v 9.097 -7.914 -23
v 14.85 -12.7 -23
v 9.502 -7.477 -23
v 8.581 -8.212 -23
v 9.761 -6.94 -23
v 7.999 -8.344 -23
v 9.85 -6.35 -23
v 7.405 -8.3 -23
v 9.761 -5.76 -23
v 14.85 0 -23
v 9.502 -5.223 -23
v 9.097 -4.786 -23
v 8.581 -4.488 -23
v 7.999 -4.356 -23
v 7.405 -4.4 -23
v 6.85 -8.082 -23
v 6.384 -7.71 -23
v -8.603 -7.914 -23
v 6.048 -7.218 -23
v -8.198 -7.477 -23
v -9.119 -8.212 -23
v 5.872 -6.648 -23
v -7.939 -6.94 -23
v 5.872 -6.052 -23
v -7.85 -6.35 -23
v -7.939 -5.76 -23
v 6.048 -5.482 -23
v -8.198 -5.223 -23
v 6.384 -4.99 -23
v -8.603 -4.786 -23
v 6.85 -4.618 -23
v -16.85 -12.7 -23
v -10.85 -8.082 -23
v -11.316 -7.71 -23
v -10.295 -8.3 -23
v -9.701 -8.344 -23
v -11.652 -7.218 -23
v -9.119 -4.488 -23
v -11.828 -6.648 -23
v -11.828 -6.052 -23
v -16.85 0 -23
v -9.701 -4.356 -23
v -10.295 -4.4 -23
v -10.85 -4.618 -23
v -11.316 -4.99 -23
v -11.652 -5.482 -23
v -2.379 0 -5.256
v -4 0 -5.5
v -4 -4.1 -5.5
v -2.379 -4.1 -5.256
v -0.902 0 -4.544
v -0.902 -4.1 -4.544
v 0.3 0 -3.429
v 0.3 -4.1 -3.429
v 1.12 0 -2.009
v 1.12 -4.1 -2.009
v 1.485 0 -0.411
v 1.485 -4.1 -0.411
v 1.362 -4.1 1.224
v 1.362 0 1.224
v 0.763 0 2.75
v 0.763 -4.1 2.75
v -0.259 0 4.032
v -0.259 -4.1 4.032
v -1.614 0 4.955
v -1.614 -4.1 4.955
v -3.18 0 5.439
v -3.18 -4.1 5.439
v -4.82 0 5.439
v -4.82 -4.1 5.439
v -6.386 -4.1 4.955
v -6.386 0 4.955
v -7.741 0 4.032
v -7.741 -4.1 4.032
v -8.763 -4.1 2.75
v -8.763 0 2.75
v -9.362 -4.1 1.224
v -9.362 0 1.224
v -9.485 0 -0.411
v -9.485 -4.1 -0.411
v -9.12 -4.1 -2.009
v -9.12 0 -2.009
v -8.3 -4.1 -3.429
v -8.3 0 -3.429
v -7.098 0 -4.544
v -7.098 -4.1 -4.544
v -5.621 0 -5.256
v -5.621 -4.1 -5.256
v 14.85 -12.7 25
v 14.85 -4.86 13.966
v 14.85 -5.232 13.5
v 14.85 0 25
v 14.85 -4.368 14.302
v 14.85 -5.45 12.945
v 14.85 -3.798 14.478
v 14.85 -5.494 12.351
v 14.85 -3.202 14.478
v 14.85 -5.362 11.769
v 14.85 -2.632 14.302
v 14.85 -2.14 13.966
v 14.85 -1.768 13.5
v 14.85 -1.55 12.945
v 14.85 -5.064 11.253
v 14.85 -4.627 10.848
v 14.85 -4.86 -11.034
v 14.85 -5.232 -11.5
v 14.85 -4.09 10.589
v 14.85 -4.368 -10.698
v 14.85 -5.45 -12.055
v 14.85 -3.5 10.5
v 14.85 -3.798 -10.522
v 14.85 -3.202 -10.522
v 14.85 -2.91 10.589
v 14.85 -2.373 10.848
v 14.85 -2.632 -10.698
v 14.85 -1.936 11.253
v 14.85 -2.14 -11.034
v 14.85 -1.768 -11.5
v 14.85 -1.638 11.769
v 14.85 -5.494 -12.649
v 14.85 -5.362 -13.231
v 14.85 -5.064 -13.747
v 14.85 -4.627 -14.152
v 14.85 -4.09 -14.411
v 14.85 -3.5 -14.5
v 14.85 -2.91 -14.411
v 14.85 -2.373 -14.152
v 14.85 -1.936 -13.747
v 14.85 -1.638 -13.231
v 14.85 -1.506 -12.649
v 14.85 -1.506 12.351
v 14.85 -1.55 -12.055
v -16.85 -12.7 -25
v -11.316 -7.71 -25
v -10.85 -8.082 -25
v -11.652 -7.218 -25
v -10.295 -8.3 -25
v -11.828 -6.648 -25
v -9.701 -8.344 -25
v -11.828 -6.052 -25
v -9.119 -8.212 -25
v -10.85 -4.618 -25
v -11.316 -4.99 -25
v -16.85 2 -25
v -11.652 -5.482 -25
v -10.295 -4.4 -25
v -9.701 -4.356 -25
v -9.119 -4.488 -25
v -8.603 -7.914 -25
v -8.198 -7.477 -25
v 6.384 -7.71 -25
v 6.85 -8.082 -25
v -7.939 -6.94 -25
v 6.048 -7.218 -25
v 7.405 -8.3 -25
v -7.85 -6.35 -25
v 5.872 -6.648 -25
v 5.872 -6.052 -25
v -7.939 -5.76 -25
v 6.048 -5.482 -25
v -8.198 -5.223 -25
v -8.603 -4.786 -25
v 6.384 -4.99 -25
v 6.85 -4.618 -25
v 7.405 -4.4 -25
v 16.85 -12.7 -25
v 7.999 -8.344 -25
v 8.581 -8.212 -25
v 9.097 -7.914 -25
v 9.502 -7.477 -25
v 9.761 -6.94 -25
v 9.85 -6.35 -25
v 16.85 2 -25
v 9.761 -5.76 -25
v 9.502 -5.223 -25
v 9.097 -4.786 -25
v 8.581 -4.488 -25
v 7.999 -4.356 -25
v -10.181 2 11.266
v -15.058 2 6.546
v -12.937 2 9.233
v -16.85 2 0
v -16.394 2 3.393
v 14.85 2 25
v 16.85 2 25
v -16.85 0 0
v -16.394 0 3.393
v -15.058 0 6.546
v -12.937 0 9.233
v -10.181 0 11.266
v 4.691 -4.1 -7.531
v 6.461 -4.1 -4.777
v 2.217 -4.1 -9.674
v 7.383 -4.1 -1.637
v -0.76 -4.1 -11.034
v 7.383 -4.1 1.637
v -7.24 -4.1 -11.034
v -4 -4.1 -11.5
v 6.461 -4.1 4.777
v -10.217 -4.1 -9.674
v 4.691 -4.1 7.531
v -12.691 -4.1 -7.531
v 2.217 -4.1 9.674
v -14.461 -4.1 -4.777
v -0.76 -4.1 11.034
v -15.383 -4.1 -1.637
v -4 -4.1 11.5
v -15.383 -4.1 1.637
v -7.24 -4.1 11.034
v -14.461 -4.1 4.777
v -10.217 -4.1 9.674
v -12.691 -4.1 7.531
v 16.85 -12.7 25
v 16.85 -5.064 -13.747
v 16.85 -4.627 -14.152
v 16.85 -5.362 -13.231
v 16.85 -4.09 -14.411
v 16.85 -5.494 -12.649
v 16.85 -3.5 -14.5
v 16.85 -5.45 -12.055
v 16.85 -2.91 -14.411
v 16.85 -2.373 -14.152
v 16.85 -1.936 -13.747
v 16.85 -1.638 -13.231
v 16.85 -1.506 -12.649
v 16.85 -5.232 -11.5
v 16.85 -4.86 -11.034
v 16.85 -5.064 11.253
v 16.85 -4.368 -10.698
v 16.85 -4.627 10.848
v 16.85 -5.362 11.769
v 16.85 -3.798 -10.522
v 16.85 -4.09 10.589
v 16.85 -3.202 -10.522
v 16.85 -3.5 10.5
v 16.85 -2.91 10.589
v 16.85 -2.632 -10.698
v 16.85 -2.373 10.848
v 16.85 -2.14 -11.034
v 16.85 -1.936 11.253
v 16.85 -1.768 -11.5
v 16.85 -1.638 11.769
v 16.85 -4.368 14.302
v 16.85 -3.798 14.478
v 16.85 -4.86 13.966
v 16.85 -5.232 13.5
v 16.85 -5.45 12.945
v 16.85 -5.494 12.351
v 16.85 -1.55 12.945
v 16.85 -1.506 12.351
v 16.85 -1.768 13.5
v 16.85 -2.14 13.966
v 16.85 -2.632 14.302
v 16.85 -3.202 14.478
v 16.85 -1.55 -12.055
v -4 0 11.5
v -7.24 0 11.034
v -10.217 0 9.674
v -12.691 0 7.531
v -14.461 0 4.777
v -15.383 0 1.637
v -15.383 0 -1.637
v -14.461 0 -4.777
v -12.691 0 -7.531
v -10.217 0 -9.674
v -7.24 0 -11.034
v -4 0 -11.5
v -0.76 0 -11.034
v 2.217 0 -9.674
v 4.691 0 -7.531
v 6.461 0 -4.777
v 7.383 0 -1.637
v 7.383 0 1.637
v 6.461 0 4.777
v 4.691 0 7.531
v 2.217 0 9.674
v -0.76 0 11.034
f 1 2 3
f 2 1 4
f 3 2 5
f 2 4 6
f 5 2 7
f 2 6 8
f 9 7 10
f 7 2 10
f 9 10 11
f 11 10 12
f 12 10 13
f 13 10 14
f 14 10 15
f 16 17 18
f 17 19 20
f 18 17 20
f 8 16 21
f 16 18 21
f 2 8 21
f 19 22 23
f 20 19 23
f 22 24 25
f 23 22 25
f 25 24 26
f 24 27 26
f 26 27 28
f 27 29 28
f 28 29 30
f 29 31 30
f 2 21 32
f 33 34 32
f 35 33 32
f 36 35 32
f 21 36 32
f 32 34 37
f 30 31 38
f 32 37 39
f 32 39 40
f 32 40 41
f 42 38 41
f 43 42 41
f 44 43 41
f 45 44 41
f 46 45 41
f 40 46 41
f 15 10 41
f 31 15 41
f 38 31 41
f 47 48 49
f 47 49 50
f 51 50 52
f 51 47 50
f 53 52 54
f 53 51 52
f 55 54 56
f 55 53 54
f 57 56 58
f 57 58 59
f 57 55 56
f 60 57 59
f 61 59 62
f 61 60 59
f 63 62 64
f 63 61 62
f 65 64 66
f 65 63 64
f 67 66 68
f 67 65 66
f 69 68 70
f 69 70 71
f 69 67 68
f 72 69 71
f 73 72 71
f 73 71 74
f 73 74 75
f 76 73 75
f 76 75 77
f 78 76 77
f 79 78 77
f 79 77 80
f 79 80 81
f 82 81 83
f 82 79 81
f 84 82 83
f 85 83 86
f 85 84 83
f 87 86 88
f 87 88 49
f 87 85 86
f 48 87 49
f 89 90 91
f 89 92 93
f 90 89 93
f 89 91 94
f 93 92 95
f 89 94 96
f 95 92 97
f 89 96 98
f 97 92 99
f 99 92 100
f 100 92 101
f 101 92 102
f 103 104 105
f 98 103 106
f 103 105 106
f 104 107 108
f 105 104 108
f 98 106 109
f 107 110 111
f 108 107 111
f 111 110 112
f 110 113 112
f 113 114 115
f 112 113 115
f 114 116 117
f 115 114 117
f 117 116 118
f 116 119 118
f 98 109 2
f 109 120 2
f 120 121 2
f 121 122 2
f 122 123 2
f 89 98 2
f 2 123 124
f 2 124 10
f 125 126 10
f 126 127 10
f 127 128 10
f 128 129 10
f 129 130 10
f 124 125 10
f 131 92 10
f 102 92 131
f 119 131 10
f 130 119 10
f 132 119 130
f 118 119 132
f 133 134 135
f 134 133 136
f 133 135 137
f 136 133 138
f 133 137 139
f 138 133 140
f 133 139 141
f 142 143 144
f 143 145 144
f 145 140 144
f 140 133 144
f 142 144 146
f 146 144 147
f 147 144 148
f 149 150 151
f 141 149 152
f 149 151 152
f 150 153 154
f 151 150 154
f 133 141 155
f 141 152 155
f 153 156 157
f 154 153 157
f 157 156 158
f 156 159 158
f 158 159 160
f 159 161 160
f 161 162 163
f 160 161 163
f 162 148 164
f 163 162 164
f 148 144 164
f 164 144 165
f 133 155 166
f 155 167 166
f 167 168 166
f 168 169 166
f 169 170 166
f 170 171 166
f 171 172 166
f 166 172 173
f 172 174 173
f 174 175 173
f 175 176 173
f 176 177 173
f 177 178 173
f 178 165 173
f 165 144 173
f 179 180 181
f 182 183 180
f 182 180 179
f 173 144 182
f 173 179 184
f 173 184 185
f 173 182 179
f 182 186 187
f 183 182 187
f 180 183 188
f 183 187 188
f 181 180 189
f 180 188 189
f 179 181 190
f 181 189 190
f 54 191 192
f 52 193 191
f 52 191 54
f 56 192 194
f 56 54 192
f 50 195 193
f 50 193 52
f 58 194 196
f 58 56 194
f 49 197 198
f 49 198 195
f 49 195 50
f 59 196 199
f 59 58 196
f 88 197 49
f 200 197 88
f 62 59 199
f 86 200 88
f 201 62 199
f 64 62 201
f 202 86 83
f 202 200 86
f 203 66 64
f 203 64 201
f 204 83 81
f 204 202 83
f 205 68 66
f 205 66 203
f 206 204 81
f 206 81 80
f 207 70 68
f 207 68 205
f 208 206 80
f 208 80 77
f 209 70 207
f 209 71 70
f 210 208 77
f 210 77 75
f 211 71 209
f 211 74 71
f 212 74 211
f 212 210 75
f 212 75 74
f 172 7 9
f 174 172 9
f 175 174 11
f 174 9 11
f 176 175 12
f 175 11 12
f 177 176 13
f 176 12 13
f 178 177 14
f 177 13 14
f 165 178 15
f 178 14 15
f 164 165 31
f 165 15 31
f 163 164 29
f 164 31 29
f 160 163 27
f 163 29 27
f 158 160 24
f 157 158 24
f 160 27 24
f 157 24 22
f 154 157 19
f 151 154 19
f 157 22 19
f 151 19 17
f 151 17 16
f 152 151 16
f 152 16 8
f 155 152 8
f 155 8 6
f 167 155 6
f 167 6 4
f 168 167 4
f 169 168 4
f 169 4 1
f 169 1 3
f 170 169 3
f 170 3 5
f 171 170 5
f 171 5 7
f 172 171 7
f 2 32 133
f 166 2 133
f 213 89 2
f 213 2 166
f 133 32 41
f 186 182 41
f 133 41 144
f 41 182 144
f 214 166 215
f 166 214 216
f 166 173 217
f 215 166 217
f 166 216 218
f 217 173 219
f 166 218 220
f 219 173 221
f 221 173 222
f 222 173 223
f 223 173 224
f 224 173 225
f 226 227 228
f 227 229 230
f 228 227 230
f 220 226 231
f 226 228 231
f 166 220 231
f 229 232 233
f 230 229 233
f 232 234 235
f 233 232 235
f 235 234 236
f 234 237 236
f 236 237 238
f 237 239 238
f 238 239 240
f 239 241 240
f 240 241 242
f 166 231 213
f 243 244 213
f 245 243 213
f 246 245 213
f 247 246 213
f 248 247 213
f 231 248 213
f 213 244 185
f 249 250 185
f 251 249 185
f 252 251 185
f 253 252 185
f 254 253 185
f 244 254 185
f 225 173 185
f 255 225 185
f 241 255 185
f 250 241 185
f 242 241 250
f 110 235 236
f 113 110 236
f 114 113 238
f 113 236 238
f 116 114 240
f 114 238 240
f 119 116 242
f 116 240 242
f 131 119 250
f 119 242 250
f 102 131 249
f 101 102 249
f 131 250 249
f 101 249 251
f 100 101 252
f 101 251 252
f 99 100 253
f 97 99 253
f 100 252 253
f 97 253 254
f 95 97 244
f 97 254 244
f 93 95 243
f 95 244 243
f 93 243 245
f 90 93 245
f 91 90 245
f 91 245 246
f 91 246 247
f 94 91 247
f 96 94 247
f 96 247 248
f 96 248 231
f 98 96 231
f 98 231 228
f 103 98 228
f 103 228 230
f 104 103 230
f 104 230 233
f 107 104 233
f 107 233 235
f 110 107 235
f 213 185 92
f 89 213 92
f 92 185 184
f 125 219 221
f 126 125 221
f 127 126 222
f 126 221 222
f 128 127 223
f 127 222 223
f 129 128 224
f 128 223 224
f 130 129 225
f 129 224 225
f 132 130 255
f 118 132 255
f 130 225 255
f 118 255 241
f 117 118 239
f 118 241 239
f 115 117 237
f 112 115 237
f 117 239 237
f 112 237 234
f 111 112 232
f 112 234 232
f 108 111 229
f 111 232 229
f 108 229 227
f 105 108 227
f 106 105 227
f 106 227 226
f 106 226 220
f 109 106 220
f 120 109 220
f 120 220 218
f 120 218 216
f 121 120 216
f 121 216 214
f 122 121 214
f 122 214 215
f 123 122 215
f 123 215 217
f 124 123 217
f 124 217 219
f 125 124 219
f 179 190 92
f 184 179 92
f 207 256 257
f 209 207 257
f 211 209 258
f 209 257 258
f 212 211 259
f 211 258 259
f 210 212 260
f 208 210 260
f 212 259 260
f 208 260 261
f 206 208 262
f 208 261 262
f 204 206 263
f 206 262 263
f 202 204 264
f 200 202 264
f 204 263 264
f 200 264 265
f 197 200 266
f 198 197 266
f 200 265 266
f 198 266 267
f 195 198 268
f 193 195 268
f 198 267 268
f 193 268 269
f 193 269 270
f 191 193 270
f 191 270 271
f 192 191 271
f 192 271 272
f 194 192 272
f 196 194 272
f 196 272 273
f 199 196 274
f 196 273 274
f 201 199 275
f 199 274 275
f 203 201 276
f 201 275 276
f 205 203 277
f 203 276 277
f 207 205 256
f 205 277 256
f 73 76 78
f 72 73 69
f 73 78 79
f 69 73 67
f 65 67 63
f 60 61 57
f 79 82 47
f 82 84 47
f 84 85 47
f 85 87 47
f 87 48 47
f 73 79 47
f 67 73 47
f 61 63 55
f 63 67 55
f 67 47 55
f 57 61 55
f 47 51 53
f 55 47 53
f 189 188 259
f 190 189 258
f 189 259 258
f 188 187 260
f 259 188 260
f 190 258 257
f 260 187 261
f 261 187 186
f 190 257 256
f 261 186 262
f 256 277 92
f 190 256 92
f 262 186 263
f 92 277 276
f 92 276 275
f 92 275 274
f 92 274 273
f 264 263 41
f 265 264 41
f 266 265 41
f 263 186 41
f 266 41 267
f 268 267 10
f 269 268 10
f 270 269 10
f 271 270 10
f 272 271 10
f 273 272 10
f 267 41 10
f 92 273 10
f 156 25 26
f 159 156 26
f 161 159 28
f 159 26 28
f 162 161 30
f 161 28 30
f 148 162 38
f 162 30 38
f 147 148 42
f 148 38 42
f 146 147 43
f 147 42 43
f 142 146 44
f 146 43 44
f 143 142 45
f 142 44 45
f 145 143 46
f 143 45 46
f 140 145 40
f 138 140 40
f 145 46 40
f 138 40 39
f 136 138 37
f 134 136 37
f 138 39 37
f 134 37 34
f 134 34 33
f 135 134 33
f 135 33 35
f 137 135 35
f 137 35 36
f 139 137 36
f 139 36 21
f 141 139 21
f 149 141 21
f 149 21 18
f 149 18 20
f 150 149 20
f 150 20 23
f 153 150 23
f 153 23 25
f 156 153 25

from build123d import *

# Parameters (mm, degrees)
SKETCH2_W                    = 33.7
SKETCH2_H                    = 50
BOSS_EXTRUDE1_DEPTH          = 2
BOSS_EXTRUDE2_DEPTH          = 12.7
CUT_EXTRUDE1_REACH           = 45.84
SKETCH4_R                    = 2
SKETCH5_R                    = 11.5
SKETCH5_R_2                  = 5.5
BOSS_EXTRUDE3_DEPTH          = 4.1
CUT_EXTRUDE_THIN1_DEPTH      = 34.541206001
CUT_EXTRUDE_THIN1_DEPTH_BACK = 8.2
CUT_EXTRUDE2_REACH           = 54.433
SKETCH7_R                    = 2


with BuildPart() as part:
    # Sketch2 → Boss-Extrude1 (new body)
    with BuildSketch(Plane(origin=(0, 0, 0), x_dir=(1, 0, 0), z_dir=(0, 1, 0))):
        Rectangle(SKETCH2_W, SKETCH2_H)
    extrude(amount=BOSS_EXTRUDE1_DEPTH)

    # Sketch3 → Boss-Extrude2 (add)
    with BuildSketch(Plane.XZ):
        Polygon((14.85, 25), (14.85, -23), (-16.85, -23), (-16.85, -25), (16.85, -25), (16.85, 25), align=None)
    extrude(amount=BOSS_EXTRUDE2_DEPTH)

    # Sketch4 → Cut-Extrude1 (cut, up to next)
    with BuildSketch(Plane(origin=(16.85, 0, 0), x_dir=(0, 0, -1), z_dir=(1, 0, 0)), mode=Mode.PRIVATE) as cut_extrude1_sk1:
        with Locations((12.5, -3.5)):
            Circle(SKETCH4_R)
    cut_extrude1_tool1 = extrude(cut_extrude1_sk1.sketch, amount=-CUT_EXTRUDE1_REACH, mode=Mode.PRIVATE) & part.part
    # Sketch4 → Cut-Extrude1 (cut, up to next)
    with BuildSketch(Plane(origin=(16.85, 0, 0), x_dir=(0, 0, -1), z_dir=(1, 0, 0)), mode=Mode.PRIVATE) as cut_extrude1_sk2:
        with Locations((-12.5, -3.5)):
            Circle(SKETCH4_R)
    cut_extrude1_tool2 = extrude(cut_extrude1_sk2.sketch, amount=-CUT_EXTRUDE1_REACH, mode=Mode.PRIVATE) & part.part
    add(cut_extrude1_tool1.solids().sort_by_distance((16.85, -3.5, -12.5))[0], mode=Mode.SUBTRACT)
    add(cut_extrude1_tool2.solids().sort_by_distance((16.85, -3.5, 12.5))[0], mode=Mode.SUBTRACT)

    # Sketch5 → Boss-Extrude3 (add)
    with BuildSketch(Plane.XZ):
        with Locations(Location((-4, 0, 0), (0, 0, 90))):
            Circle(SKETCH5_R)
        with Locations(Location((-4, 0, 0), (0, 0, 270))):
            Circle(SKETCH5_R_2, mode=Mode.SUBTRACT)
    extrude(amount=BOSS_EXTRUDE3_DEPTH)

    # Sketch6 → Cut-Extrude-Thin1 (cut, two sides: drawn at the far end of the back side and taken through both)
    with BuildSketch(Plane(origin=(0, 2, 0), x_dir=(1, 0, 0), z_dir=(0, 1, 0)).offset(-CUT_EXTRUDE_THIN1_DEPTH_BACK)):
        with BuildLine():
            ThreePointArc((-16.85, 0), (-15.057855322, -6.545711243), (-10.181309623, -11.265607456))
            Line((-10.181309623, -11.265607456), (14.85, -25))
            Line((14.85, -25), (5.229284634, -42.534019386))
            Line((5.229284634, -42.534019386), (-19.802024989, -28.799626842))
            ThreePointArc((-19.802024989, -28.799626842), (-32.268525084, -16.733588663), (-36.85, 0))
            Line((-36.85, 0), (-16.85, 0))
        make_face()
    extrude(amount=CUT_EXTRUDE_THIN1_DEPTH + CUT_EXTRUDE_THIN1_DEPTH_BACK, mode=Mode.SUBTRACT)

    # Sketch7 → Cut-Extrude2 (cut, up to next)
    with BuildSketch(Plane.XY.offset(-23), mode=Mode.PRIVATE) as cut_extrude2_sk1:
        with Locations((-9.85, -6.35)):
            Circle(SKETCH7_R)
    cut_extrude2_tool1 = extrude(cut_extrude2_sk1.sketch, amount=-CUT_EXTRUDE2_REACH, mode=Mode.PRIVATE) & part.part
    # Sketch7 → Cut-Extrude2 (cut, up to next)
    with BuildSketch(Plane.XY.offset(-23), mode=Mode.PRIVATE) as cut_extrude2_sk2:
        with Locations((7.85, -6.35)):
            Circle(SKETCH7_R)
    cut_extrude2_tool2 = extrude(cut_extrude2_sk2.sketch, amount=-CUT_EXTRUDE2_REACH, mode=Mode.PRIVATE) & part.part
    add(cut_extrude2_tool1.solids().sort_by_distance((-9.85, -6.35, -23))[0], mode=Mode.SUBTRACT)
    add(cut_extrude2_tool2.solids().sort_by_distance((7.85, -6.35, -23))[0], mode=Mode.SUBTRACT)


solid = part.part
